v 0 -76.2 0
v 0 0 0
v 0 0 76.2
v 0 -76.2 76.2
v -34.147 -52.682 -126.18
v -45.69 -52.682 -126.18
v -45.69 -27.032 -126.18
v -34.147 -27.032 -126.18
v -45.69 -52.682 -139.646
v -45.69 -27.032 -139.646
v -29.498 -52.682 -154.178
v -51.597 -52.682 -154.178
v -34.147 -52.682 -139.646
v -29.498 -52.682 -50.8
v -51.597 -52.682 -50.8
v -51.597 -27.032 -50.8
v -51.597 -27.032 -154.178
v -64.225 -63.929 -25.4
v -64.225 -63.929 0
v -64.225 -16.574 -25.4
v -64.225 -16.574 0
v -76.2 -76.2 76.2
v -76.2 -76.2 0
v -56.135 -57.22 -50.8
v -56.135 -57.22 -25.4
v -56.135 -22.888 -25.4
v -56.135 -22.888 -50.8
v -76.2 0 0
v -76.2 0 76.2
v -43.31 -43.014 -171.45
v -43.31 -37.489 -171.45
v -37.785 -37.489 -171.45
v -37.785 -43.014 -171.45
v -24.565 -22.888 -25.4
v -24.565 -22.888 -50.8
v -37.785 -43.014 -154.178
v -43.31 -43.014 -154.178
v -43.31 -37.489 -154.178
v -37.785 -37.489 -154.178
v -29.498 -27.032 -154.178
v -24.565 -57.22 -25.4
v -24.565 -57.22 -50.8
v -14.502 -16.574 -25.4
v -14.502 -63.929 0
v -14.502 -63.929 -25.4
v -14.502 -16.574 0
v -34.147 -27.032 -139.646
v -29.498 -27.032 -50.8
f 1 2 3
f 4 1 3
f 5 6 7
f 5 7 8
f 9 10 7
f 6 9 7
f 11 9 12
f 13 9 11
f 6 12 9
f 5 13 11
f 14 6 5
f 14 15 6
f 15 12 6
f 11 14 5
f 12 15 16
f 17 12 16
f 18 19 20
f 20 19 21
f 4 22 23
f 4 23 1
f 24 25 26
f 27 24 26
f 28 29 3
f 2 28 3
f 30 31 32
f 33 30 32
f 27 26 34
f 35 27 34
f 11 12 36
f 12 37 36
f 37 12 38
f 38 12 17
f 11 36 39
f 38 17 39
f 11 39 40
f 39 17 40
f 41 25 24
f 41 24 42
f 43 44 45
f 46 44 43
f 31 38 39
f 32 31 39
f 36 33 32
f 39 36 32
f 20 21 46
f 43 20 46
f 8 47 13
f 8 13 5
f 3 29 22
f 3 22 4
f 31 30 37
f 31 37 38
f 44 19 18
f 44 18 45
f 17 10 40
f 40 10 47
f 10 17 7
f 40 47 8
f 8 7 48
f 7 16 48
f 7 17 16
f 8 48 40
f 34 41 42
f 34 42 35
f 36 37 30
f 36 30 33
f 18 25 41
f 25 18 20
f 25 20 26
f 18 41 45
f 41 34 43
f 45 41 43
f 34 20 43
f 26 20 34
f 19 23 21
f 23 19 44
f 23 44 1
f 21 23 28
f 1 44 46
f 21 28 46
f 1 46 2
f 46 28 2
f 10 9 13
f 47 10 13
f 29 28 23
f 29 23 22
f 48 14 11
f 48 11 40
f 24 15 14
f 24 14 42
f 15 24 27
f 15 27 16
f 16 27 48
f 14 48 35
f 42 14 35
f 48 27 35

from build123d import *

# Parameters (mm, degrees)
F0_W      = 76.2
F0_H      = 76.2
F1_DEPTH  = 76.2
F2_W      = 49.722627
F2_H      = 47.354873
F3_DEPTH  = 25.4
F4_W      = 31.569913
F4_H      = 34.332275
F5_DEPTH  = 50.8
F6_W      = 22.098936
F6_H      = 25.650553
F7_DEPTH  = 154.178
F8_W      = 5.524732
F8_H      = 5.524733
F9_DEPTH  = 171.45
F10_W     = 11.54276
F10_H     = 13.466537
F11_DEPTH = 96.774


with BuildPart() as f1:
    # F0 (on Front) → F1 (new body)
    with BuildSketch(Plane.XZ):
        with Locations((-38.1, 38.1)):
            Rectangle(F0_W, F0_H)
    extrude(amount=F1_DEPTH)

    # F2 (on Top) → F3 (join)
    with BuildSketch(Plane.XY):
        with Locations((-39.363734, -40.251642)):
            Rectangle(F2_W, F2_H)
    extrude(amount=-F3_DEPTH)

    # F4 (on Top) → F5 (join)
    with BuildSketch(Plane.XY):
        with Locations((-40.350295, -40.054333)):
            Rectangle(F4_W, F4_H)
    extrude(amount=-F5_DEPTH)

    # F6 (on Top) → F7 (join)
    with BuildSketch(Plane.XY):
        with Locations((-40.547609, -39.857018)):
            Rectangle(F6_W, F6_H)
    extrude(amount=-F7_DEPTH)

    # F8 (on Top) → F9 (join)
    with BuildSketch(Plane.XY):
        with Locations((-40.547609, -40.251643)):
            Rectangle(F8_W, F8_H)
    extrude(amount=-F9_DEPTH)

    # F10 (on Front) → F11 (cut)
    with BuildSketch(Plane.XZ):
        with Locations((-39.91868, -132.913097)):
            Rectangle(F10_W, F10_H)
    extrude(amount=F11_DEPTH, mode=Mode.SUBTRACT)


solid = f1.part
